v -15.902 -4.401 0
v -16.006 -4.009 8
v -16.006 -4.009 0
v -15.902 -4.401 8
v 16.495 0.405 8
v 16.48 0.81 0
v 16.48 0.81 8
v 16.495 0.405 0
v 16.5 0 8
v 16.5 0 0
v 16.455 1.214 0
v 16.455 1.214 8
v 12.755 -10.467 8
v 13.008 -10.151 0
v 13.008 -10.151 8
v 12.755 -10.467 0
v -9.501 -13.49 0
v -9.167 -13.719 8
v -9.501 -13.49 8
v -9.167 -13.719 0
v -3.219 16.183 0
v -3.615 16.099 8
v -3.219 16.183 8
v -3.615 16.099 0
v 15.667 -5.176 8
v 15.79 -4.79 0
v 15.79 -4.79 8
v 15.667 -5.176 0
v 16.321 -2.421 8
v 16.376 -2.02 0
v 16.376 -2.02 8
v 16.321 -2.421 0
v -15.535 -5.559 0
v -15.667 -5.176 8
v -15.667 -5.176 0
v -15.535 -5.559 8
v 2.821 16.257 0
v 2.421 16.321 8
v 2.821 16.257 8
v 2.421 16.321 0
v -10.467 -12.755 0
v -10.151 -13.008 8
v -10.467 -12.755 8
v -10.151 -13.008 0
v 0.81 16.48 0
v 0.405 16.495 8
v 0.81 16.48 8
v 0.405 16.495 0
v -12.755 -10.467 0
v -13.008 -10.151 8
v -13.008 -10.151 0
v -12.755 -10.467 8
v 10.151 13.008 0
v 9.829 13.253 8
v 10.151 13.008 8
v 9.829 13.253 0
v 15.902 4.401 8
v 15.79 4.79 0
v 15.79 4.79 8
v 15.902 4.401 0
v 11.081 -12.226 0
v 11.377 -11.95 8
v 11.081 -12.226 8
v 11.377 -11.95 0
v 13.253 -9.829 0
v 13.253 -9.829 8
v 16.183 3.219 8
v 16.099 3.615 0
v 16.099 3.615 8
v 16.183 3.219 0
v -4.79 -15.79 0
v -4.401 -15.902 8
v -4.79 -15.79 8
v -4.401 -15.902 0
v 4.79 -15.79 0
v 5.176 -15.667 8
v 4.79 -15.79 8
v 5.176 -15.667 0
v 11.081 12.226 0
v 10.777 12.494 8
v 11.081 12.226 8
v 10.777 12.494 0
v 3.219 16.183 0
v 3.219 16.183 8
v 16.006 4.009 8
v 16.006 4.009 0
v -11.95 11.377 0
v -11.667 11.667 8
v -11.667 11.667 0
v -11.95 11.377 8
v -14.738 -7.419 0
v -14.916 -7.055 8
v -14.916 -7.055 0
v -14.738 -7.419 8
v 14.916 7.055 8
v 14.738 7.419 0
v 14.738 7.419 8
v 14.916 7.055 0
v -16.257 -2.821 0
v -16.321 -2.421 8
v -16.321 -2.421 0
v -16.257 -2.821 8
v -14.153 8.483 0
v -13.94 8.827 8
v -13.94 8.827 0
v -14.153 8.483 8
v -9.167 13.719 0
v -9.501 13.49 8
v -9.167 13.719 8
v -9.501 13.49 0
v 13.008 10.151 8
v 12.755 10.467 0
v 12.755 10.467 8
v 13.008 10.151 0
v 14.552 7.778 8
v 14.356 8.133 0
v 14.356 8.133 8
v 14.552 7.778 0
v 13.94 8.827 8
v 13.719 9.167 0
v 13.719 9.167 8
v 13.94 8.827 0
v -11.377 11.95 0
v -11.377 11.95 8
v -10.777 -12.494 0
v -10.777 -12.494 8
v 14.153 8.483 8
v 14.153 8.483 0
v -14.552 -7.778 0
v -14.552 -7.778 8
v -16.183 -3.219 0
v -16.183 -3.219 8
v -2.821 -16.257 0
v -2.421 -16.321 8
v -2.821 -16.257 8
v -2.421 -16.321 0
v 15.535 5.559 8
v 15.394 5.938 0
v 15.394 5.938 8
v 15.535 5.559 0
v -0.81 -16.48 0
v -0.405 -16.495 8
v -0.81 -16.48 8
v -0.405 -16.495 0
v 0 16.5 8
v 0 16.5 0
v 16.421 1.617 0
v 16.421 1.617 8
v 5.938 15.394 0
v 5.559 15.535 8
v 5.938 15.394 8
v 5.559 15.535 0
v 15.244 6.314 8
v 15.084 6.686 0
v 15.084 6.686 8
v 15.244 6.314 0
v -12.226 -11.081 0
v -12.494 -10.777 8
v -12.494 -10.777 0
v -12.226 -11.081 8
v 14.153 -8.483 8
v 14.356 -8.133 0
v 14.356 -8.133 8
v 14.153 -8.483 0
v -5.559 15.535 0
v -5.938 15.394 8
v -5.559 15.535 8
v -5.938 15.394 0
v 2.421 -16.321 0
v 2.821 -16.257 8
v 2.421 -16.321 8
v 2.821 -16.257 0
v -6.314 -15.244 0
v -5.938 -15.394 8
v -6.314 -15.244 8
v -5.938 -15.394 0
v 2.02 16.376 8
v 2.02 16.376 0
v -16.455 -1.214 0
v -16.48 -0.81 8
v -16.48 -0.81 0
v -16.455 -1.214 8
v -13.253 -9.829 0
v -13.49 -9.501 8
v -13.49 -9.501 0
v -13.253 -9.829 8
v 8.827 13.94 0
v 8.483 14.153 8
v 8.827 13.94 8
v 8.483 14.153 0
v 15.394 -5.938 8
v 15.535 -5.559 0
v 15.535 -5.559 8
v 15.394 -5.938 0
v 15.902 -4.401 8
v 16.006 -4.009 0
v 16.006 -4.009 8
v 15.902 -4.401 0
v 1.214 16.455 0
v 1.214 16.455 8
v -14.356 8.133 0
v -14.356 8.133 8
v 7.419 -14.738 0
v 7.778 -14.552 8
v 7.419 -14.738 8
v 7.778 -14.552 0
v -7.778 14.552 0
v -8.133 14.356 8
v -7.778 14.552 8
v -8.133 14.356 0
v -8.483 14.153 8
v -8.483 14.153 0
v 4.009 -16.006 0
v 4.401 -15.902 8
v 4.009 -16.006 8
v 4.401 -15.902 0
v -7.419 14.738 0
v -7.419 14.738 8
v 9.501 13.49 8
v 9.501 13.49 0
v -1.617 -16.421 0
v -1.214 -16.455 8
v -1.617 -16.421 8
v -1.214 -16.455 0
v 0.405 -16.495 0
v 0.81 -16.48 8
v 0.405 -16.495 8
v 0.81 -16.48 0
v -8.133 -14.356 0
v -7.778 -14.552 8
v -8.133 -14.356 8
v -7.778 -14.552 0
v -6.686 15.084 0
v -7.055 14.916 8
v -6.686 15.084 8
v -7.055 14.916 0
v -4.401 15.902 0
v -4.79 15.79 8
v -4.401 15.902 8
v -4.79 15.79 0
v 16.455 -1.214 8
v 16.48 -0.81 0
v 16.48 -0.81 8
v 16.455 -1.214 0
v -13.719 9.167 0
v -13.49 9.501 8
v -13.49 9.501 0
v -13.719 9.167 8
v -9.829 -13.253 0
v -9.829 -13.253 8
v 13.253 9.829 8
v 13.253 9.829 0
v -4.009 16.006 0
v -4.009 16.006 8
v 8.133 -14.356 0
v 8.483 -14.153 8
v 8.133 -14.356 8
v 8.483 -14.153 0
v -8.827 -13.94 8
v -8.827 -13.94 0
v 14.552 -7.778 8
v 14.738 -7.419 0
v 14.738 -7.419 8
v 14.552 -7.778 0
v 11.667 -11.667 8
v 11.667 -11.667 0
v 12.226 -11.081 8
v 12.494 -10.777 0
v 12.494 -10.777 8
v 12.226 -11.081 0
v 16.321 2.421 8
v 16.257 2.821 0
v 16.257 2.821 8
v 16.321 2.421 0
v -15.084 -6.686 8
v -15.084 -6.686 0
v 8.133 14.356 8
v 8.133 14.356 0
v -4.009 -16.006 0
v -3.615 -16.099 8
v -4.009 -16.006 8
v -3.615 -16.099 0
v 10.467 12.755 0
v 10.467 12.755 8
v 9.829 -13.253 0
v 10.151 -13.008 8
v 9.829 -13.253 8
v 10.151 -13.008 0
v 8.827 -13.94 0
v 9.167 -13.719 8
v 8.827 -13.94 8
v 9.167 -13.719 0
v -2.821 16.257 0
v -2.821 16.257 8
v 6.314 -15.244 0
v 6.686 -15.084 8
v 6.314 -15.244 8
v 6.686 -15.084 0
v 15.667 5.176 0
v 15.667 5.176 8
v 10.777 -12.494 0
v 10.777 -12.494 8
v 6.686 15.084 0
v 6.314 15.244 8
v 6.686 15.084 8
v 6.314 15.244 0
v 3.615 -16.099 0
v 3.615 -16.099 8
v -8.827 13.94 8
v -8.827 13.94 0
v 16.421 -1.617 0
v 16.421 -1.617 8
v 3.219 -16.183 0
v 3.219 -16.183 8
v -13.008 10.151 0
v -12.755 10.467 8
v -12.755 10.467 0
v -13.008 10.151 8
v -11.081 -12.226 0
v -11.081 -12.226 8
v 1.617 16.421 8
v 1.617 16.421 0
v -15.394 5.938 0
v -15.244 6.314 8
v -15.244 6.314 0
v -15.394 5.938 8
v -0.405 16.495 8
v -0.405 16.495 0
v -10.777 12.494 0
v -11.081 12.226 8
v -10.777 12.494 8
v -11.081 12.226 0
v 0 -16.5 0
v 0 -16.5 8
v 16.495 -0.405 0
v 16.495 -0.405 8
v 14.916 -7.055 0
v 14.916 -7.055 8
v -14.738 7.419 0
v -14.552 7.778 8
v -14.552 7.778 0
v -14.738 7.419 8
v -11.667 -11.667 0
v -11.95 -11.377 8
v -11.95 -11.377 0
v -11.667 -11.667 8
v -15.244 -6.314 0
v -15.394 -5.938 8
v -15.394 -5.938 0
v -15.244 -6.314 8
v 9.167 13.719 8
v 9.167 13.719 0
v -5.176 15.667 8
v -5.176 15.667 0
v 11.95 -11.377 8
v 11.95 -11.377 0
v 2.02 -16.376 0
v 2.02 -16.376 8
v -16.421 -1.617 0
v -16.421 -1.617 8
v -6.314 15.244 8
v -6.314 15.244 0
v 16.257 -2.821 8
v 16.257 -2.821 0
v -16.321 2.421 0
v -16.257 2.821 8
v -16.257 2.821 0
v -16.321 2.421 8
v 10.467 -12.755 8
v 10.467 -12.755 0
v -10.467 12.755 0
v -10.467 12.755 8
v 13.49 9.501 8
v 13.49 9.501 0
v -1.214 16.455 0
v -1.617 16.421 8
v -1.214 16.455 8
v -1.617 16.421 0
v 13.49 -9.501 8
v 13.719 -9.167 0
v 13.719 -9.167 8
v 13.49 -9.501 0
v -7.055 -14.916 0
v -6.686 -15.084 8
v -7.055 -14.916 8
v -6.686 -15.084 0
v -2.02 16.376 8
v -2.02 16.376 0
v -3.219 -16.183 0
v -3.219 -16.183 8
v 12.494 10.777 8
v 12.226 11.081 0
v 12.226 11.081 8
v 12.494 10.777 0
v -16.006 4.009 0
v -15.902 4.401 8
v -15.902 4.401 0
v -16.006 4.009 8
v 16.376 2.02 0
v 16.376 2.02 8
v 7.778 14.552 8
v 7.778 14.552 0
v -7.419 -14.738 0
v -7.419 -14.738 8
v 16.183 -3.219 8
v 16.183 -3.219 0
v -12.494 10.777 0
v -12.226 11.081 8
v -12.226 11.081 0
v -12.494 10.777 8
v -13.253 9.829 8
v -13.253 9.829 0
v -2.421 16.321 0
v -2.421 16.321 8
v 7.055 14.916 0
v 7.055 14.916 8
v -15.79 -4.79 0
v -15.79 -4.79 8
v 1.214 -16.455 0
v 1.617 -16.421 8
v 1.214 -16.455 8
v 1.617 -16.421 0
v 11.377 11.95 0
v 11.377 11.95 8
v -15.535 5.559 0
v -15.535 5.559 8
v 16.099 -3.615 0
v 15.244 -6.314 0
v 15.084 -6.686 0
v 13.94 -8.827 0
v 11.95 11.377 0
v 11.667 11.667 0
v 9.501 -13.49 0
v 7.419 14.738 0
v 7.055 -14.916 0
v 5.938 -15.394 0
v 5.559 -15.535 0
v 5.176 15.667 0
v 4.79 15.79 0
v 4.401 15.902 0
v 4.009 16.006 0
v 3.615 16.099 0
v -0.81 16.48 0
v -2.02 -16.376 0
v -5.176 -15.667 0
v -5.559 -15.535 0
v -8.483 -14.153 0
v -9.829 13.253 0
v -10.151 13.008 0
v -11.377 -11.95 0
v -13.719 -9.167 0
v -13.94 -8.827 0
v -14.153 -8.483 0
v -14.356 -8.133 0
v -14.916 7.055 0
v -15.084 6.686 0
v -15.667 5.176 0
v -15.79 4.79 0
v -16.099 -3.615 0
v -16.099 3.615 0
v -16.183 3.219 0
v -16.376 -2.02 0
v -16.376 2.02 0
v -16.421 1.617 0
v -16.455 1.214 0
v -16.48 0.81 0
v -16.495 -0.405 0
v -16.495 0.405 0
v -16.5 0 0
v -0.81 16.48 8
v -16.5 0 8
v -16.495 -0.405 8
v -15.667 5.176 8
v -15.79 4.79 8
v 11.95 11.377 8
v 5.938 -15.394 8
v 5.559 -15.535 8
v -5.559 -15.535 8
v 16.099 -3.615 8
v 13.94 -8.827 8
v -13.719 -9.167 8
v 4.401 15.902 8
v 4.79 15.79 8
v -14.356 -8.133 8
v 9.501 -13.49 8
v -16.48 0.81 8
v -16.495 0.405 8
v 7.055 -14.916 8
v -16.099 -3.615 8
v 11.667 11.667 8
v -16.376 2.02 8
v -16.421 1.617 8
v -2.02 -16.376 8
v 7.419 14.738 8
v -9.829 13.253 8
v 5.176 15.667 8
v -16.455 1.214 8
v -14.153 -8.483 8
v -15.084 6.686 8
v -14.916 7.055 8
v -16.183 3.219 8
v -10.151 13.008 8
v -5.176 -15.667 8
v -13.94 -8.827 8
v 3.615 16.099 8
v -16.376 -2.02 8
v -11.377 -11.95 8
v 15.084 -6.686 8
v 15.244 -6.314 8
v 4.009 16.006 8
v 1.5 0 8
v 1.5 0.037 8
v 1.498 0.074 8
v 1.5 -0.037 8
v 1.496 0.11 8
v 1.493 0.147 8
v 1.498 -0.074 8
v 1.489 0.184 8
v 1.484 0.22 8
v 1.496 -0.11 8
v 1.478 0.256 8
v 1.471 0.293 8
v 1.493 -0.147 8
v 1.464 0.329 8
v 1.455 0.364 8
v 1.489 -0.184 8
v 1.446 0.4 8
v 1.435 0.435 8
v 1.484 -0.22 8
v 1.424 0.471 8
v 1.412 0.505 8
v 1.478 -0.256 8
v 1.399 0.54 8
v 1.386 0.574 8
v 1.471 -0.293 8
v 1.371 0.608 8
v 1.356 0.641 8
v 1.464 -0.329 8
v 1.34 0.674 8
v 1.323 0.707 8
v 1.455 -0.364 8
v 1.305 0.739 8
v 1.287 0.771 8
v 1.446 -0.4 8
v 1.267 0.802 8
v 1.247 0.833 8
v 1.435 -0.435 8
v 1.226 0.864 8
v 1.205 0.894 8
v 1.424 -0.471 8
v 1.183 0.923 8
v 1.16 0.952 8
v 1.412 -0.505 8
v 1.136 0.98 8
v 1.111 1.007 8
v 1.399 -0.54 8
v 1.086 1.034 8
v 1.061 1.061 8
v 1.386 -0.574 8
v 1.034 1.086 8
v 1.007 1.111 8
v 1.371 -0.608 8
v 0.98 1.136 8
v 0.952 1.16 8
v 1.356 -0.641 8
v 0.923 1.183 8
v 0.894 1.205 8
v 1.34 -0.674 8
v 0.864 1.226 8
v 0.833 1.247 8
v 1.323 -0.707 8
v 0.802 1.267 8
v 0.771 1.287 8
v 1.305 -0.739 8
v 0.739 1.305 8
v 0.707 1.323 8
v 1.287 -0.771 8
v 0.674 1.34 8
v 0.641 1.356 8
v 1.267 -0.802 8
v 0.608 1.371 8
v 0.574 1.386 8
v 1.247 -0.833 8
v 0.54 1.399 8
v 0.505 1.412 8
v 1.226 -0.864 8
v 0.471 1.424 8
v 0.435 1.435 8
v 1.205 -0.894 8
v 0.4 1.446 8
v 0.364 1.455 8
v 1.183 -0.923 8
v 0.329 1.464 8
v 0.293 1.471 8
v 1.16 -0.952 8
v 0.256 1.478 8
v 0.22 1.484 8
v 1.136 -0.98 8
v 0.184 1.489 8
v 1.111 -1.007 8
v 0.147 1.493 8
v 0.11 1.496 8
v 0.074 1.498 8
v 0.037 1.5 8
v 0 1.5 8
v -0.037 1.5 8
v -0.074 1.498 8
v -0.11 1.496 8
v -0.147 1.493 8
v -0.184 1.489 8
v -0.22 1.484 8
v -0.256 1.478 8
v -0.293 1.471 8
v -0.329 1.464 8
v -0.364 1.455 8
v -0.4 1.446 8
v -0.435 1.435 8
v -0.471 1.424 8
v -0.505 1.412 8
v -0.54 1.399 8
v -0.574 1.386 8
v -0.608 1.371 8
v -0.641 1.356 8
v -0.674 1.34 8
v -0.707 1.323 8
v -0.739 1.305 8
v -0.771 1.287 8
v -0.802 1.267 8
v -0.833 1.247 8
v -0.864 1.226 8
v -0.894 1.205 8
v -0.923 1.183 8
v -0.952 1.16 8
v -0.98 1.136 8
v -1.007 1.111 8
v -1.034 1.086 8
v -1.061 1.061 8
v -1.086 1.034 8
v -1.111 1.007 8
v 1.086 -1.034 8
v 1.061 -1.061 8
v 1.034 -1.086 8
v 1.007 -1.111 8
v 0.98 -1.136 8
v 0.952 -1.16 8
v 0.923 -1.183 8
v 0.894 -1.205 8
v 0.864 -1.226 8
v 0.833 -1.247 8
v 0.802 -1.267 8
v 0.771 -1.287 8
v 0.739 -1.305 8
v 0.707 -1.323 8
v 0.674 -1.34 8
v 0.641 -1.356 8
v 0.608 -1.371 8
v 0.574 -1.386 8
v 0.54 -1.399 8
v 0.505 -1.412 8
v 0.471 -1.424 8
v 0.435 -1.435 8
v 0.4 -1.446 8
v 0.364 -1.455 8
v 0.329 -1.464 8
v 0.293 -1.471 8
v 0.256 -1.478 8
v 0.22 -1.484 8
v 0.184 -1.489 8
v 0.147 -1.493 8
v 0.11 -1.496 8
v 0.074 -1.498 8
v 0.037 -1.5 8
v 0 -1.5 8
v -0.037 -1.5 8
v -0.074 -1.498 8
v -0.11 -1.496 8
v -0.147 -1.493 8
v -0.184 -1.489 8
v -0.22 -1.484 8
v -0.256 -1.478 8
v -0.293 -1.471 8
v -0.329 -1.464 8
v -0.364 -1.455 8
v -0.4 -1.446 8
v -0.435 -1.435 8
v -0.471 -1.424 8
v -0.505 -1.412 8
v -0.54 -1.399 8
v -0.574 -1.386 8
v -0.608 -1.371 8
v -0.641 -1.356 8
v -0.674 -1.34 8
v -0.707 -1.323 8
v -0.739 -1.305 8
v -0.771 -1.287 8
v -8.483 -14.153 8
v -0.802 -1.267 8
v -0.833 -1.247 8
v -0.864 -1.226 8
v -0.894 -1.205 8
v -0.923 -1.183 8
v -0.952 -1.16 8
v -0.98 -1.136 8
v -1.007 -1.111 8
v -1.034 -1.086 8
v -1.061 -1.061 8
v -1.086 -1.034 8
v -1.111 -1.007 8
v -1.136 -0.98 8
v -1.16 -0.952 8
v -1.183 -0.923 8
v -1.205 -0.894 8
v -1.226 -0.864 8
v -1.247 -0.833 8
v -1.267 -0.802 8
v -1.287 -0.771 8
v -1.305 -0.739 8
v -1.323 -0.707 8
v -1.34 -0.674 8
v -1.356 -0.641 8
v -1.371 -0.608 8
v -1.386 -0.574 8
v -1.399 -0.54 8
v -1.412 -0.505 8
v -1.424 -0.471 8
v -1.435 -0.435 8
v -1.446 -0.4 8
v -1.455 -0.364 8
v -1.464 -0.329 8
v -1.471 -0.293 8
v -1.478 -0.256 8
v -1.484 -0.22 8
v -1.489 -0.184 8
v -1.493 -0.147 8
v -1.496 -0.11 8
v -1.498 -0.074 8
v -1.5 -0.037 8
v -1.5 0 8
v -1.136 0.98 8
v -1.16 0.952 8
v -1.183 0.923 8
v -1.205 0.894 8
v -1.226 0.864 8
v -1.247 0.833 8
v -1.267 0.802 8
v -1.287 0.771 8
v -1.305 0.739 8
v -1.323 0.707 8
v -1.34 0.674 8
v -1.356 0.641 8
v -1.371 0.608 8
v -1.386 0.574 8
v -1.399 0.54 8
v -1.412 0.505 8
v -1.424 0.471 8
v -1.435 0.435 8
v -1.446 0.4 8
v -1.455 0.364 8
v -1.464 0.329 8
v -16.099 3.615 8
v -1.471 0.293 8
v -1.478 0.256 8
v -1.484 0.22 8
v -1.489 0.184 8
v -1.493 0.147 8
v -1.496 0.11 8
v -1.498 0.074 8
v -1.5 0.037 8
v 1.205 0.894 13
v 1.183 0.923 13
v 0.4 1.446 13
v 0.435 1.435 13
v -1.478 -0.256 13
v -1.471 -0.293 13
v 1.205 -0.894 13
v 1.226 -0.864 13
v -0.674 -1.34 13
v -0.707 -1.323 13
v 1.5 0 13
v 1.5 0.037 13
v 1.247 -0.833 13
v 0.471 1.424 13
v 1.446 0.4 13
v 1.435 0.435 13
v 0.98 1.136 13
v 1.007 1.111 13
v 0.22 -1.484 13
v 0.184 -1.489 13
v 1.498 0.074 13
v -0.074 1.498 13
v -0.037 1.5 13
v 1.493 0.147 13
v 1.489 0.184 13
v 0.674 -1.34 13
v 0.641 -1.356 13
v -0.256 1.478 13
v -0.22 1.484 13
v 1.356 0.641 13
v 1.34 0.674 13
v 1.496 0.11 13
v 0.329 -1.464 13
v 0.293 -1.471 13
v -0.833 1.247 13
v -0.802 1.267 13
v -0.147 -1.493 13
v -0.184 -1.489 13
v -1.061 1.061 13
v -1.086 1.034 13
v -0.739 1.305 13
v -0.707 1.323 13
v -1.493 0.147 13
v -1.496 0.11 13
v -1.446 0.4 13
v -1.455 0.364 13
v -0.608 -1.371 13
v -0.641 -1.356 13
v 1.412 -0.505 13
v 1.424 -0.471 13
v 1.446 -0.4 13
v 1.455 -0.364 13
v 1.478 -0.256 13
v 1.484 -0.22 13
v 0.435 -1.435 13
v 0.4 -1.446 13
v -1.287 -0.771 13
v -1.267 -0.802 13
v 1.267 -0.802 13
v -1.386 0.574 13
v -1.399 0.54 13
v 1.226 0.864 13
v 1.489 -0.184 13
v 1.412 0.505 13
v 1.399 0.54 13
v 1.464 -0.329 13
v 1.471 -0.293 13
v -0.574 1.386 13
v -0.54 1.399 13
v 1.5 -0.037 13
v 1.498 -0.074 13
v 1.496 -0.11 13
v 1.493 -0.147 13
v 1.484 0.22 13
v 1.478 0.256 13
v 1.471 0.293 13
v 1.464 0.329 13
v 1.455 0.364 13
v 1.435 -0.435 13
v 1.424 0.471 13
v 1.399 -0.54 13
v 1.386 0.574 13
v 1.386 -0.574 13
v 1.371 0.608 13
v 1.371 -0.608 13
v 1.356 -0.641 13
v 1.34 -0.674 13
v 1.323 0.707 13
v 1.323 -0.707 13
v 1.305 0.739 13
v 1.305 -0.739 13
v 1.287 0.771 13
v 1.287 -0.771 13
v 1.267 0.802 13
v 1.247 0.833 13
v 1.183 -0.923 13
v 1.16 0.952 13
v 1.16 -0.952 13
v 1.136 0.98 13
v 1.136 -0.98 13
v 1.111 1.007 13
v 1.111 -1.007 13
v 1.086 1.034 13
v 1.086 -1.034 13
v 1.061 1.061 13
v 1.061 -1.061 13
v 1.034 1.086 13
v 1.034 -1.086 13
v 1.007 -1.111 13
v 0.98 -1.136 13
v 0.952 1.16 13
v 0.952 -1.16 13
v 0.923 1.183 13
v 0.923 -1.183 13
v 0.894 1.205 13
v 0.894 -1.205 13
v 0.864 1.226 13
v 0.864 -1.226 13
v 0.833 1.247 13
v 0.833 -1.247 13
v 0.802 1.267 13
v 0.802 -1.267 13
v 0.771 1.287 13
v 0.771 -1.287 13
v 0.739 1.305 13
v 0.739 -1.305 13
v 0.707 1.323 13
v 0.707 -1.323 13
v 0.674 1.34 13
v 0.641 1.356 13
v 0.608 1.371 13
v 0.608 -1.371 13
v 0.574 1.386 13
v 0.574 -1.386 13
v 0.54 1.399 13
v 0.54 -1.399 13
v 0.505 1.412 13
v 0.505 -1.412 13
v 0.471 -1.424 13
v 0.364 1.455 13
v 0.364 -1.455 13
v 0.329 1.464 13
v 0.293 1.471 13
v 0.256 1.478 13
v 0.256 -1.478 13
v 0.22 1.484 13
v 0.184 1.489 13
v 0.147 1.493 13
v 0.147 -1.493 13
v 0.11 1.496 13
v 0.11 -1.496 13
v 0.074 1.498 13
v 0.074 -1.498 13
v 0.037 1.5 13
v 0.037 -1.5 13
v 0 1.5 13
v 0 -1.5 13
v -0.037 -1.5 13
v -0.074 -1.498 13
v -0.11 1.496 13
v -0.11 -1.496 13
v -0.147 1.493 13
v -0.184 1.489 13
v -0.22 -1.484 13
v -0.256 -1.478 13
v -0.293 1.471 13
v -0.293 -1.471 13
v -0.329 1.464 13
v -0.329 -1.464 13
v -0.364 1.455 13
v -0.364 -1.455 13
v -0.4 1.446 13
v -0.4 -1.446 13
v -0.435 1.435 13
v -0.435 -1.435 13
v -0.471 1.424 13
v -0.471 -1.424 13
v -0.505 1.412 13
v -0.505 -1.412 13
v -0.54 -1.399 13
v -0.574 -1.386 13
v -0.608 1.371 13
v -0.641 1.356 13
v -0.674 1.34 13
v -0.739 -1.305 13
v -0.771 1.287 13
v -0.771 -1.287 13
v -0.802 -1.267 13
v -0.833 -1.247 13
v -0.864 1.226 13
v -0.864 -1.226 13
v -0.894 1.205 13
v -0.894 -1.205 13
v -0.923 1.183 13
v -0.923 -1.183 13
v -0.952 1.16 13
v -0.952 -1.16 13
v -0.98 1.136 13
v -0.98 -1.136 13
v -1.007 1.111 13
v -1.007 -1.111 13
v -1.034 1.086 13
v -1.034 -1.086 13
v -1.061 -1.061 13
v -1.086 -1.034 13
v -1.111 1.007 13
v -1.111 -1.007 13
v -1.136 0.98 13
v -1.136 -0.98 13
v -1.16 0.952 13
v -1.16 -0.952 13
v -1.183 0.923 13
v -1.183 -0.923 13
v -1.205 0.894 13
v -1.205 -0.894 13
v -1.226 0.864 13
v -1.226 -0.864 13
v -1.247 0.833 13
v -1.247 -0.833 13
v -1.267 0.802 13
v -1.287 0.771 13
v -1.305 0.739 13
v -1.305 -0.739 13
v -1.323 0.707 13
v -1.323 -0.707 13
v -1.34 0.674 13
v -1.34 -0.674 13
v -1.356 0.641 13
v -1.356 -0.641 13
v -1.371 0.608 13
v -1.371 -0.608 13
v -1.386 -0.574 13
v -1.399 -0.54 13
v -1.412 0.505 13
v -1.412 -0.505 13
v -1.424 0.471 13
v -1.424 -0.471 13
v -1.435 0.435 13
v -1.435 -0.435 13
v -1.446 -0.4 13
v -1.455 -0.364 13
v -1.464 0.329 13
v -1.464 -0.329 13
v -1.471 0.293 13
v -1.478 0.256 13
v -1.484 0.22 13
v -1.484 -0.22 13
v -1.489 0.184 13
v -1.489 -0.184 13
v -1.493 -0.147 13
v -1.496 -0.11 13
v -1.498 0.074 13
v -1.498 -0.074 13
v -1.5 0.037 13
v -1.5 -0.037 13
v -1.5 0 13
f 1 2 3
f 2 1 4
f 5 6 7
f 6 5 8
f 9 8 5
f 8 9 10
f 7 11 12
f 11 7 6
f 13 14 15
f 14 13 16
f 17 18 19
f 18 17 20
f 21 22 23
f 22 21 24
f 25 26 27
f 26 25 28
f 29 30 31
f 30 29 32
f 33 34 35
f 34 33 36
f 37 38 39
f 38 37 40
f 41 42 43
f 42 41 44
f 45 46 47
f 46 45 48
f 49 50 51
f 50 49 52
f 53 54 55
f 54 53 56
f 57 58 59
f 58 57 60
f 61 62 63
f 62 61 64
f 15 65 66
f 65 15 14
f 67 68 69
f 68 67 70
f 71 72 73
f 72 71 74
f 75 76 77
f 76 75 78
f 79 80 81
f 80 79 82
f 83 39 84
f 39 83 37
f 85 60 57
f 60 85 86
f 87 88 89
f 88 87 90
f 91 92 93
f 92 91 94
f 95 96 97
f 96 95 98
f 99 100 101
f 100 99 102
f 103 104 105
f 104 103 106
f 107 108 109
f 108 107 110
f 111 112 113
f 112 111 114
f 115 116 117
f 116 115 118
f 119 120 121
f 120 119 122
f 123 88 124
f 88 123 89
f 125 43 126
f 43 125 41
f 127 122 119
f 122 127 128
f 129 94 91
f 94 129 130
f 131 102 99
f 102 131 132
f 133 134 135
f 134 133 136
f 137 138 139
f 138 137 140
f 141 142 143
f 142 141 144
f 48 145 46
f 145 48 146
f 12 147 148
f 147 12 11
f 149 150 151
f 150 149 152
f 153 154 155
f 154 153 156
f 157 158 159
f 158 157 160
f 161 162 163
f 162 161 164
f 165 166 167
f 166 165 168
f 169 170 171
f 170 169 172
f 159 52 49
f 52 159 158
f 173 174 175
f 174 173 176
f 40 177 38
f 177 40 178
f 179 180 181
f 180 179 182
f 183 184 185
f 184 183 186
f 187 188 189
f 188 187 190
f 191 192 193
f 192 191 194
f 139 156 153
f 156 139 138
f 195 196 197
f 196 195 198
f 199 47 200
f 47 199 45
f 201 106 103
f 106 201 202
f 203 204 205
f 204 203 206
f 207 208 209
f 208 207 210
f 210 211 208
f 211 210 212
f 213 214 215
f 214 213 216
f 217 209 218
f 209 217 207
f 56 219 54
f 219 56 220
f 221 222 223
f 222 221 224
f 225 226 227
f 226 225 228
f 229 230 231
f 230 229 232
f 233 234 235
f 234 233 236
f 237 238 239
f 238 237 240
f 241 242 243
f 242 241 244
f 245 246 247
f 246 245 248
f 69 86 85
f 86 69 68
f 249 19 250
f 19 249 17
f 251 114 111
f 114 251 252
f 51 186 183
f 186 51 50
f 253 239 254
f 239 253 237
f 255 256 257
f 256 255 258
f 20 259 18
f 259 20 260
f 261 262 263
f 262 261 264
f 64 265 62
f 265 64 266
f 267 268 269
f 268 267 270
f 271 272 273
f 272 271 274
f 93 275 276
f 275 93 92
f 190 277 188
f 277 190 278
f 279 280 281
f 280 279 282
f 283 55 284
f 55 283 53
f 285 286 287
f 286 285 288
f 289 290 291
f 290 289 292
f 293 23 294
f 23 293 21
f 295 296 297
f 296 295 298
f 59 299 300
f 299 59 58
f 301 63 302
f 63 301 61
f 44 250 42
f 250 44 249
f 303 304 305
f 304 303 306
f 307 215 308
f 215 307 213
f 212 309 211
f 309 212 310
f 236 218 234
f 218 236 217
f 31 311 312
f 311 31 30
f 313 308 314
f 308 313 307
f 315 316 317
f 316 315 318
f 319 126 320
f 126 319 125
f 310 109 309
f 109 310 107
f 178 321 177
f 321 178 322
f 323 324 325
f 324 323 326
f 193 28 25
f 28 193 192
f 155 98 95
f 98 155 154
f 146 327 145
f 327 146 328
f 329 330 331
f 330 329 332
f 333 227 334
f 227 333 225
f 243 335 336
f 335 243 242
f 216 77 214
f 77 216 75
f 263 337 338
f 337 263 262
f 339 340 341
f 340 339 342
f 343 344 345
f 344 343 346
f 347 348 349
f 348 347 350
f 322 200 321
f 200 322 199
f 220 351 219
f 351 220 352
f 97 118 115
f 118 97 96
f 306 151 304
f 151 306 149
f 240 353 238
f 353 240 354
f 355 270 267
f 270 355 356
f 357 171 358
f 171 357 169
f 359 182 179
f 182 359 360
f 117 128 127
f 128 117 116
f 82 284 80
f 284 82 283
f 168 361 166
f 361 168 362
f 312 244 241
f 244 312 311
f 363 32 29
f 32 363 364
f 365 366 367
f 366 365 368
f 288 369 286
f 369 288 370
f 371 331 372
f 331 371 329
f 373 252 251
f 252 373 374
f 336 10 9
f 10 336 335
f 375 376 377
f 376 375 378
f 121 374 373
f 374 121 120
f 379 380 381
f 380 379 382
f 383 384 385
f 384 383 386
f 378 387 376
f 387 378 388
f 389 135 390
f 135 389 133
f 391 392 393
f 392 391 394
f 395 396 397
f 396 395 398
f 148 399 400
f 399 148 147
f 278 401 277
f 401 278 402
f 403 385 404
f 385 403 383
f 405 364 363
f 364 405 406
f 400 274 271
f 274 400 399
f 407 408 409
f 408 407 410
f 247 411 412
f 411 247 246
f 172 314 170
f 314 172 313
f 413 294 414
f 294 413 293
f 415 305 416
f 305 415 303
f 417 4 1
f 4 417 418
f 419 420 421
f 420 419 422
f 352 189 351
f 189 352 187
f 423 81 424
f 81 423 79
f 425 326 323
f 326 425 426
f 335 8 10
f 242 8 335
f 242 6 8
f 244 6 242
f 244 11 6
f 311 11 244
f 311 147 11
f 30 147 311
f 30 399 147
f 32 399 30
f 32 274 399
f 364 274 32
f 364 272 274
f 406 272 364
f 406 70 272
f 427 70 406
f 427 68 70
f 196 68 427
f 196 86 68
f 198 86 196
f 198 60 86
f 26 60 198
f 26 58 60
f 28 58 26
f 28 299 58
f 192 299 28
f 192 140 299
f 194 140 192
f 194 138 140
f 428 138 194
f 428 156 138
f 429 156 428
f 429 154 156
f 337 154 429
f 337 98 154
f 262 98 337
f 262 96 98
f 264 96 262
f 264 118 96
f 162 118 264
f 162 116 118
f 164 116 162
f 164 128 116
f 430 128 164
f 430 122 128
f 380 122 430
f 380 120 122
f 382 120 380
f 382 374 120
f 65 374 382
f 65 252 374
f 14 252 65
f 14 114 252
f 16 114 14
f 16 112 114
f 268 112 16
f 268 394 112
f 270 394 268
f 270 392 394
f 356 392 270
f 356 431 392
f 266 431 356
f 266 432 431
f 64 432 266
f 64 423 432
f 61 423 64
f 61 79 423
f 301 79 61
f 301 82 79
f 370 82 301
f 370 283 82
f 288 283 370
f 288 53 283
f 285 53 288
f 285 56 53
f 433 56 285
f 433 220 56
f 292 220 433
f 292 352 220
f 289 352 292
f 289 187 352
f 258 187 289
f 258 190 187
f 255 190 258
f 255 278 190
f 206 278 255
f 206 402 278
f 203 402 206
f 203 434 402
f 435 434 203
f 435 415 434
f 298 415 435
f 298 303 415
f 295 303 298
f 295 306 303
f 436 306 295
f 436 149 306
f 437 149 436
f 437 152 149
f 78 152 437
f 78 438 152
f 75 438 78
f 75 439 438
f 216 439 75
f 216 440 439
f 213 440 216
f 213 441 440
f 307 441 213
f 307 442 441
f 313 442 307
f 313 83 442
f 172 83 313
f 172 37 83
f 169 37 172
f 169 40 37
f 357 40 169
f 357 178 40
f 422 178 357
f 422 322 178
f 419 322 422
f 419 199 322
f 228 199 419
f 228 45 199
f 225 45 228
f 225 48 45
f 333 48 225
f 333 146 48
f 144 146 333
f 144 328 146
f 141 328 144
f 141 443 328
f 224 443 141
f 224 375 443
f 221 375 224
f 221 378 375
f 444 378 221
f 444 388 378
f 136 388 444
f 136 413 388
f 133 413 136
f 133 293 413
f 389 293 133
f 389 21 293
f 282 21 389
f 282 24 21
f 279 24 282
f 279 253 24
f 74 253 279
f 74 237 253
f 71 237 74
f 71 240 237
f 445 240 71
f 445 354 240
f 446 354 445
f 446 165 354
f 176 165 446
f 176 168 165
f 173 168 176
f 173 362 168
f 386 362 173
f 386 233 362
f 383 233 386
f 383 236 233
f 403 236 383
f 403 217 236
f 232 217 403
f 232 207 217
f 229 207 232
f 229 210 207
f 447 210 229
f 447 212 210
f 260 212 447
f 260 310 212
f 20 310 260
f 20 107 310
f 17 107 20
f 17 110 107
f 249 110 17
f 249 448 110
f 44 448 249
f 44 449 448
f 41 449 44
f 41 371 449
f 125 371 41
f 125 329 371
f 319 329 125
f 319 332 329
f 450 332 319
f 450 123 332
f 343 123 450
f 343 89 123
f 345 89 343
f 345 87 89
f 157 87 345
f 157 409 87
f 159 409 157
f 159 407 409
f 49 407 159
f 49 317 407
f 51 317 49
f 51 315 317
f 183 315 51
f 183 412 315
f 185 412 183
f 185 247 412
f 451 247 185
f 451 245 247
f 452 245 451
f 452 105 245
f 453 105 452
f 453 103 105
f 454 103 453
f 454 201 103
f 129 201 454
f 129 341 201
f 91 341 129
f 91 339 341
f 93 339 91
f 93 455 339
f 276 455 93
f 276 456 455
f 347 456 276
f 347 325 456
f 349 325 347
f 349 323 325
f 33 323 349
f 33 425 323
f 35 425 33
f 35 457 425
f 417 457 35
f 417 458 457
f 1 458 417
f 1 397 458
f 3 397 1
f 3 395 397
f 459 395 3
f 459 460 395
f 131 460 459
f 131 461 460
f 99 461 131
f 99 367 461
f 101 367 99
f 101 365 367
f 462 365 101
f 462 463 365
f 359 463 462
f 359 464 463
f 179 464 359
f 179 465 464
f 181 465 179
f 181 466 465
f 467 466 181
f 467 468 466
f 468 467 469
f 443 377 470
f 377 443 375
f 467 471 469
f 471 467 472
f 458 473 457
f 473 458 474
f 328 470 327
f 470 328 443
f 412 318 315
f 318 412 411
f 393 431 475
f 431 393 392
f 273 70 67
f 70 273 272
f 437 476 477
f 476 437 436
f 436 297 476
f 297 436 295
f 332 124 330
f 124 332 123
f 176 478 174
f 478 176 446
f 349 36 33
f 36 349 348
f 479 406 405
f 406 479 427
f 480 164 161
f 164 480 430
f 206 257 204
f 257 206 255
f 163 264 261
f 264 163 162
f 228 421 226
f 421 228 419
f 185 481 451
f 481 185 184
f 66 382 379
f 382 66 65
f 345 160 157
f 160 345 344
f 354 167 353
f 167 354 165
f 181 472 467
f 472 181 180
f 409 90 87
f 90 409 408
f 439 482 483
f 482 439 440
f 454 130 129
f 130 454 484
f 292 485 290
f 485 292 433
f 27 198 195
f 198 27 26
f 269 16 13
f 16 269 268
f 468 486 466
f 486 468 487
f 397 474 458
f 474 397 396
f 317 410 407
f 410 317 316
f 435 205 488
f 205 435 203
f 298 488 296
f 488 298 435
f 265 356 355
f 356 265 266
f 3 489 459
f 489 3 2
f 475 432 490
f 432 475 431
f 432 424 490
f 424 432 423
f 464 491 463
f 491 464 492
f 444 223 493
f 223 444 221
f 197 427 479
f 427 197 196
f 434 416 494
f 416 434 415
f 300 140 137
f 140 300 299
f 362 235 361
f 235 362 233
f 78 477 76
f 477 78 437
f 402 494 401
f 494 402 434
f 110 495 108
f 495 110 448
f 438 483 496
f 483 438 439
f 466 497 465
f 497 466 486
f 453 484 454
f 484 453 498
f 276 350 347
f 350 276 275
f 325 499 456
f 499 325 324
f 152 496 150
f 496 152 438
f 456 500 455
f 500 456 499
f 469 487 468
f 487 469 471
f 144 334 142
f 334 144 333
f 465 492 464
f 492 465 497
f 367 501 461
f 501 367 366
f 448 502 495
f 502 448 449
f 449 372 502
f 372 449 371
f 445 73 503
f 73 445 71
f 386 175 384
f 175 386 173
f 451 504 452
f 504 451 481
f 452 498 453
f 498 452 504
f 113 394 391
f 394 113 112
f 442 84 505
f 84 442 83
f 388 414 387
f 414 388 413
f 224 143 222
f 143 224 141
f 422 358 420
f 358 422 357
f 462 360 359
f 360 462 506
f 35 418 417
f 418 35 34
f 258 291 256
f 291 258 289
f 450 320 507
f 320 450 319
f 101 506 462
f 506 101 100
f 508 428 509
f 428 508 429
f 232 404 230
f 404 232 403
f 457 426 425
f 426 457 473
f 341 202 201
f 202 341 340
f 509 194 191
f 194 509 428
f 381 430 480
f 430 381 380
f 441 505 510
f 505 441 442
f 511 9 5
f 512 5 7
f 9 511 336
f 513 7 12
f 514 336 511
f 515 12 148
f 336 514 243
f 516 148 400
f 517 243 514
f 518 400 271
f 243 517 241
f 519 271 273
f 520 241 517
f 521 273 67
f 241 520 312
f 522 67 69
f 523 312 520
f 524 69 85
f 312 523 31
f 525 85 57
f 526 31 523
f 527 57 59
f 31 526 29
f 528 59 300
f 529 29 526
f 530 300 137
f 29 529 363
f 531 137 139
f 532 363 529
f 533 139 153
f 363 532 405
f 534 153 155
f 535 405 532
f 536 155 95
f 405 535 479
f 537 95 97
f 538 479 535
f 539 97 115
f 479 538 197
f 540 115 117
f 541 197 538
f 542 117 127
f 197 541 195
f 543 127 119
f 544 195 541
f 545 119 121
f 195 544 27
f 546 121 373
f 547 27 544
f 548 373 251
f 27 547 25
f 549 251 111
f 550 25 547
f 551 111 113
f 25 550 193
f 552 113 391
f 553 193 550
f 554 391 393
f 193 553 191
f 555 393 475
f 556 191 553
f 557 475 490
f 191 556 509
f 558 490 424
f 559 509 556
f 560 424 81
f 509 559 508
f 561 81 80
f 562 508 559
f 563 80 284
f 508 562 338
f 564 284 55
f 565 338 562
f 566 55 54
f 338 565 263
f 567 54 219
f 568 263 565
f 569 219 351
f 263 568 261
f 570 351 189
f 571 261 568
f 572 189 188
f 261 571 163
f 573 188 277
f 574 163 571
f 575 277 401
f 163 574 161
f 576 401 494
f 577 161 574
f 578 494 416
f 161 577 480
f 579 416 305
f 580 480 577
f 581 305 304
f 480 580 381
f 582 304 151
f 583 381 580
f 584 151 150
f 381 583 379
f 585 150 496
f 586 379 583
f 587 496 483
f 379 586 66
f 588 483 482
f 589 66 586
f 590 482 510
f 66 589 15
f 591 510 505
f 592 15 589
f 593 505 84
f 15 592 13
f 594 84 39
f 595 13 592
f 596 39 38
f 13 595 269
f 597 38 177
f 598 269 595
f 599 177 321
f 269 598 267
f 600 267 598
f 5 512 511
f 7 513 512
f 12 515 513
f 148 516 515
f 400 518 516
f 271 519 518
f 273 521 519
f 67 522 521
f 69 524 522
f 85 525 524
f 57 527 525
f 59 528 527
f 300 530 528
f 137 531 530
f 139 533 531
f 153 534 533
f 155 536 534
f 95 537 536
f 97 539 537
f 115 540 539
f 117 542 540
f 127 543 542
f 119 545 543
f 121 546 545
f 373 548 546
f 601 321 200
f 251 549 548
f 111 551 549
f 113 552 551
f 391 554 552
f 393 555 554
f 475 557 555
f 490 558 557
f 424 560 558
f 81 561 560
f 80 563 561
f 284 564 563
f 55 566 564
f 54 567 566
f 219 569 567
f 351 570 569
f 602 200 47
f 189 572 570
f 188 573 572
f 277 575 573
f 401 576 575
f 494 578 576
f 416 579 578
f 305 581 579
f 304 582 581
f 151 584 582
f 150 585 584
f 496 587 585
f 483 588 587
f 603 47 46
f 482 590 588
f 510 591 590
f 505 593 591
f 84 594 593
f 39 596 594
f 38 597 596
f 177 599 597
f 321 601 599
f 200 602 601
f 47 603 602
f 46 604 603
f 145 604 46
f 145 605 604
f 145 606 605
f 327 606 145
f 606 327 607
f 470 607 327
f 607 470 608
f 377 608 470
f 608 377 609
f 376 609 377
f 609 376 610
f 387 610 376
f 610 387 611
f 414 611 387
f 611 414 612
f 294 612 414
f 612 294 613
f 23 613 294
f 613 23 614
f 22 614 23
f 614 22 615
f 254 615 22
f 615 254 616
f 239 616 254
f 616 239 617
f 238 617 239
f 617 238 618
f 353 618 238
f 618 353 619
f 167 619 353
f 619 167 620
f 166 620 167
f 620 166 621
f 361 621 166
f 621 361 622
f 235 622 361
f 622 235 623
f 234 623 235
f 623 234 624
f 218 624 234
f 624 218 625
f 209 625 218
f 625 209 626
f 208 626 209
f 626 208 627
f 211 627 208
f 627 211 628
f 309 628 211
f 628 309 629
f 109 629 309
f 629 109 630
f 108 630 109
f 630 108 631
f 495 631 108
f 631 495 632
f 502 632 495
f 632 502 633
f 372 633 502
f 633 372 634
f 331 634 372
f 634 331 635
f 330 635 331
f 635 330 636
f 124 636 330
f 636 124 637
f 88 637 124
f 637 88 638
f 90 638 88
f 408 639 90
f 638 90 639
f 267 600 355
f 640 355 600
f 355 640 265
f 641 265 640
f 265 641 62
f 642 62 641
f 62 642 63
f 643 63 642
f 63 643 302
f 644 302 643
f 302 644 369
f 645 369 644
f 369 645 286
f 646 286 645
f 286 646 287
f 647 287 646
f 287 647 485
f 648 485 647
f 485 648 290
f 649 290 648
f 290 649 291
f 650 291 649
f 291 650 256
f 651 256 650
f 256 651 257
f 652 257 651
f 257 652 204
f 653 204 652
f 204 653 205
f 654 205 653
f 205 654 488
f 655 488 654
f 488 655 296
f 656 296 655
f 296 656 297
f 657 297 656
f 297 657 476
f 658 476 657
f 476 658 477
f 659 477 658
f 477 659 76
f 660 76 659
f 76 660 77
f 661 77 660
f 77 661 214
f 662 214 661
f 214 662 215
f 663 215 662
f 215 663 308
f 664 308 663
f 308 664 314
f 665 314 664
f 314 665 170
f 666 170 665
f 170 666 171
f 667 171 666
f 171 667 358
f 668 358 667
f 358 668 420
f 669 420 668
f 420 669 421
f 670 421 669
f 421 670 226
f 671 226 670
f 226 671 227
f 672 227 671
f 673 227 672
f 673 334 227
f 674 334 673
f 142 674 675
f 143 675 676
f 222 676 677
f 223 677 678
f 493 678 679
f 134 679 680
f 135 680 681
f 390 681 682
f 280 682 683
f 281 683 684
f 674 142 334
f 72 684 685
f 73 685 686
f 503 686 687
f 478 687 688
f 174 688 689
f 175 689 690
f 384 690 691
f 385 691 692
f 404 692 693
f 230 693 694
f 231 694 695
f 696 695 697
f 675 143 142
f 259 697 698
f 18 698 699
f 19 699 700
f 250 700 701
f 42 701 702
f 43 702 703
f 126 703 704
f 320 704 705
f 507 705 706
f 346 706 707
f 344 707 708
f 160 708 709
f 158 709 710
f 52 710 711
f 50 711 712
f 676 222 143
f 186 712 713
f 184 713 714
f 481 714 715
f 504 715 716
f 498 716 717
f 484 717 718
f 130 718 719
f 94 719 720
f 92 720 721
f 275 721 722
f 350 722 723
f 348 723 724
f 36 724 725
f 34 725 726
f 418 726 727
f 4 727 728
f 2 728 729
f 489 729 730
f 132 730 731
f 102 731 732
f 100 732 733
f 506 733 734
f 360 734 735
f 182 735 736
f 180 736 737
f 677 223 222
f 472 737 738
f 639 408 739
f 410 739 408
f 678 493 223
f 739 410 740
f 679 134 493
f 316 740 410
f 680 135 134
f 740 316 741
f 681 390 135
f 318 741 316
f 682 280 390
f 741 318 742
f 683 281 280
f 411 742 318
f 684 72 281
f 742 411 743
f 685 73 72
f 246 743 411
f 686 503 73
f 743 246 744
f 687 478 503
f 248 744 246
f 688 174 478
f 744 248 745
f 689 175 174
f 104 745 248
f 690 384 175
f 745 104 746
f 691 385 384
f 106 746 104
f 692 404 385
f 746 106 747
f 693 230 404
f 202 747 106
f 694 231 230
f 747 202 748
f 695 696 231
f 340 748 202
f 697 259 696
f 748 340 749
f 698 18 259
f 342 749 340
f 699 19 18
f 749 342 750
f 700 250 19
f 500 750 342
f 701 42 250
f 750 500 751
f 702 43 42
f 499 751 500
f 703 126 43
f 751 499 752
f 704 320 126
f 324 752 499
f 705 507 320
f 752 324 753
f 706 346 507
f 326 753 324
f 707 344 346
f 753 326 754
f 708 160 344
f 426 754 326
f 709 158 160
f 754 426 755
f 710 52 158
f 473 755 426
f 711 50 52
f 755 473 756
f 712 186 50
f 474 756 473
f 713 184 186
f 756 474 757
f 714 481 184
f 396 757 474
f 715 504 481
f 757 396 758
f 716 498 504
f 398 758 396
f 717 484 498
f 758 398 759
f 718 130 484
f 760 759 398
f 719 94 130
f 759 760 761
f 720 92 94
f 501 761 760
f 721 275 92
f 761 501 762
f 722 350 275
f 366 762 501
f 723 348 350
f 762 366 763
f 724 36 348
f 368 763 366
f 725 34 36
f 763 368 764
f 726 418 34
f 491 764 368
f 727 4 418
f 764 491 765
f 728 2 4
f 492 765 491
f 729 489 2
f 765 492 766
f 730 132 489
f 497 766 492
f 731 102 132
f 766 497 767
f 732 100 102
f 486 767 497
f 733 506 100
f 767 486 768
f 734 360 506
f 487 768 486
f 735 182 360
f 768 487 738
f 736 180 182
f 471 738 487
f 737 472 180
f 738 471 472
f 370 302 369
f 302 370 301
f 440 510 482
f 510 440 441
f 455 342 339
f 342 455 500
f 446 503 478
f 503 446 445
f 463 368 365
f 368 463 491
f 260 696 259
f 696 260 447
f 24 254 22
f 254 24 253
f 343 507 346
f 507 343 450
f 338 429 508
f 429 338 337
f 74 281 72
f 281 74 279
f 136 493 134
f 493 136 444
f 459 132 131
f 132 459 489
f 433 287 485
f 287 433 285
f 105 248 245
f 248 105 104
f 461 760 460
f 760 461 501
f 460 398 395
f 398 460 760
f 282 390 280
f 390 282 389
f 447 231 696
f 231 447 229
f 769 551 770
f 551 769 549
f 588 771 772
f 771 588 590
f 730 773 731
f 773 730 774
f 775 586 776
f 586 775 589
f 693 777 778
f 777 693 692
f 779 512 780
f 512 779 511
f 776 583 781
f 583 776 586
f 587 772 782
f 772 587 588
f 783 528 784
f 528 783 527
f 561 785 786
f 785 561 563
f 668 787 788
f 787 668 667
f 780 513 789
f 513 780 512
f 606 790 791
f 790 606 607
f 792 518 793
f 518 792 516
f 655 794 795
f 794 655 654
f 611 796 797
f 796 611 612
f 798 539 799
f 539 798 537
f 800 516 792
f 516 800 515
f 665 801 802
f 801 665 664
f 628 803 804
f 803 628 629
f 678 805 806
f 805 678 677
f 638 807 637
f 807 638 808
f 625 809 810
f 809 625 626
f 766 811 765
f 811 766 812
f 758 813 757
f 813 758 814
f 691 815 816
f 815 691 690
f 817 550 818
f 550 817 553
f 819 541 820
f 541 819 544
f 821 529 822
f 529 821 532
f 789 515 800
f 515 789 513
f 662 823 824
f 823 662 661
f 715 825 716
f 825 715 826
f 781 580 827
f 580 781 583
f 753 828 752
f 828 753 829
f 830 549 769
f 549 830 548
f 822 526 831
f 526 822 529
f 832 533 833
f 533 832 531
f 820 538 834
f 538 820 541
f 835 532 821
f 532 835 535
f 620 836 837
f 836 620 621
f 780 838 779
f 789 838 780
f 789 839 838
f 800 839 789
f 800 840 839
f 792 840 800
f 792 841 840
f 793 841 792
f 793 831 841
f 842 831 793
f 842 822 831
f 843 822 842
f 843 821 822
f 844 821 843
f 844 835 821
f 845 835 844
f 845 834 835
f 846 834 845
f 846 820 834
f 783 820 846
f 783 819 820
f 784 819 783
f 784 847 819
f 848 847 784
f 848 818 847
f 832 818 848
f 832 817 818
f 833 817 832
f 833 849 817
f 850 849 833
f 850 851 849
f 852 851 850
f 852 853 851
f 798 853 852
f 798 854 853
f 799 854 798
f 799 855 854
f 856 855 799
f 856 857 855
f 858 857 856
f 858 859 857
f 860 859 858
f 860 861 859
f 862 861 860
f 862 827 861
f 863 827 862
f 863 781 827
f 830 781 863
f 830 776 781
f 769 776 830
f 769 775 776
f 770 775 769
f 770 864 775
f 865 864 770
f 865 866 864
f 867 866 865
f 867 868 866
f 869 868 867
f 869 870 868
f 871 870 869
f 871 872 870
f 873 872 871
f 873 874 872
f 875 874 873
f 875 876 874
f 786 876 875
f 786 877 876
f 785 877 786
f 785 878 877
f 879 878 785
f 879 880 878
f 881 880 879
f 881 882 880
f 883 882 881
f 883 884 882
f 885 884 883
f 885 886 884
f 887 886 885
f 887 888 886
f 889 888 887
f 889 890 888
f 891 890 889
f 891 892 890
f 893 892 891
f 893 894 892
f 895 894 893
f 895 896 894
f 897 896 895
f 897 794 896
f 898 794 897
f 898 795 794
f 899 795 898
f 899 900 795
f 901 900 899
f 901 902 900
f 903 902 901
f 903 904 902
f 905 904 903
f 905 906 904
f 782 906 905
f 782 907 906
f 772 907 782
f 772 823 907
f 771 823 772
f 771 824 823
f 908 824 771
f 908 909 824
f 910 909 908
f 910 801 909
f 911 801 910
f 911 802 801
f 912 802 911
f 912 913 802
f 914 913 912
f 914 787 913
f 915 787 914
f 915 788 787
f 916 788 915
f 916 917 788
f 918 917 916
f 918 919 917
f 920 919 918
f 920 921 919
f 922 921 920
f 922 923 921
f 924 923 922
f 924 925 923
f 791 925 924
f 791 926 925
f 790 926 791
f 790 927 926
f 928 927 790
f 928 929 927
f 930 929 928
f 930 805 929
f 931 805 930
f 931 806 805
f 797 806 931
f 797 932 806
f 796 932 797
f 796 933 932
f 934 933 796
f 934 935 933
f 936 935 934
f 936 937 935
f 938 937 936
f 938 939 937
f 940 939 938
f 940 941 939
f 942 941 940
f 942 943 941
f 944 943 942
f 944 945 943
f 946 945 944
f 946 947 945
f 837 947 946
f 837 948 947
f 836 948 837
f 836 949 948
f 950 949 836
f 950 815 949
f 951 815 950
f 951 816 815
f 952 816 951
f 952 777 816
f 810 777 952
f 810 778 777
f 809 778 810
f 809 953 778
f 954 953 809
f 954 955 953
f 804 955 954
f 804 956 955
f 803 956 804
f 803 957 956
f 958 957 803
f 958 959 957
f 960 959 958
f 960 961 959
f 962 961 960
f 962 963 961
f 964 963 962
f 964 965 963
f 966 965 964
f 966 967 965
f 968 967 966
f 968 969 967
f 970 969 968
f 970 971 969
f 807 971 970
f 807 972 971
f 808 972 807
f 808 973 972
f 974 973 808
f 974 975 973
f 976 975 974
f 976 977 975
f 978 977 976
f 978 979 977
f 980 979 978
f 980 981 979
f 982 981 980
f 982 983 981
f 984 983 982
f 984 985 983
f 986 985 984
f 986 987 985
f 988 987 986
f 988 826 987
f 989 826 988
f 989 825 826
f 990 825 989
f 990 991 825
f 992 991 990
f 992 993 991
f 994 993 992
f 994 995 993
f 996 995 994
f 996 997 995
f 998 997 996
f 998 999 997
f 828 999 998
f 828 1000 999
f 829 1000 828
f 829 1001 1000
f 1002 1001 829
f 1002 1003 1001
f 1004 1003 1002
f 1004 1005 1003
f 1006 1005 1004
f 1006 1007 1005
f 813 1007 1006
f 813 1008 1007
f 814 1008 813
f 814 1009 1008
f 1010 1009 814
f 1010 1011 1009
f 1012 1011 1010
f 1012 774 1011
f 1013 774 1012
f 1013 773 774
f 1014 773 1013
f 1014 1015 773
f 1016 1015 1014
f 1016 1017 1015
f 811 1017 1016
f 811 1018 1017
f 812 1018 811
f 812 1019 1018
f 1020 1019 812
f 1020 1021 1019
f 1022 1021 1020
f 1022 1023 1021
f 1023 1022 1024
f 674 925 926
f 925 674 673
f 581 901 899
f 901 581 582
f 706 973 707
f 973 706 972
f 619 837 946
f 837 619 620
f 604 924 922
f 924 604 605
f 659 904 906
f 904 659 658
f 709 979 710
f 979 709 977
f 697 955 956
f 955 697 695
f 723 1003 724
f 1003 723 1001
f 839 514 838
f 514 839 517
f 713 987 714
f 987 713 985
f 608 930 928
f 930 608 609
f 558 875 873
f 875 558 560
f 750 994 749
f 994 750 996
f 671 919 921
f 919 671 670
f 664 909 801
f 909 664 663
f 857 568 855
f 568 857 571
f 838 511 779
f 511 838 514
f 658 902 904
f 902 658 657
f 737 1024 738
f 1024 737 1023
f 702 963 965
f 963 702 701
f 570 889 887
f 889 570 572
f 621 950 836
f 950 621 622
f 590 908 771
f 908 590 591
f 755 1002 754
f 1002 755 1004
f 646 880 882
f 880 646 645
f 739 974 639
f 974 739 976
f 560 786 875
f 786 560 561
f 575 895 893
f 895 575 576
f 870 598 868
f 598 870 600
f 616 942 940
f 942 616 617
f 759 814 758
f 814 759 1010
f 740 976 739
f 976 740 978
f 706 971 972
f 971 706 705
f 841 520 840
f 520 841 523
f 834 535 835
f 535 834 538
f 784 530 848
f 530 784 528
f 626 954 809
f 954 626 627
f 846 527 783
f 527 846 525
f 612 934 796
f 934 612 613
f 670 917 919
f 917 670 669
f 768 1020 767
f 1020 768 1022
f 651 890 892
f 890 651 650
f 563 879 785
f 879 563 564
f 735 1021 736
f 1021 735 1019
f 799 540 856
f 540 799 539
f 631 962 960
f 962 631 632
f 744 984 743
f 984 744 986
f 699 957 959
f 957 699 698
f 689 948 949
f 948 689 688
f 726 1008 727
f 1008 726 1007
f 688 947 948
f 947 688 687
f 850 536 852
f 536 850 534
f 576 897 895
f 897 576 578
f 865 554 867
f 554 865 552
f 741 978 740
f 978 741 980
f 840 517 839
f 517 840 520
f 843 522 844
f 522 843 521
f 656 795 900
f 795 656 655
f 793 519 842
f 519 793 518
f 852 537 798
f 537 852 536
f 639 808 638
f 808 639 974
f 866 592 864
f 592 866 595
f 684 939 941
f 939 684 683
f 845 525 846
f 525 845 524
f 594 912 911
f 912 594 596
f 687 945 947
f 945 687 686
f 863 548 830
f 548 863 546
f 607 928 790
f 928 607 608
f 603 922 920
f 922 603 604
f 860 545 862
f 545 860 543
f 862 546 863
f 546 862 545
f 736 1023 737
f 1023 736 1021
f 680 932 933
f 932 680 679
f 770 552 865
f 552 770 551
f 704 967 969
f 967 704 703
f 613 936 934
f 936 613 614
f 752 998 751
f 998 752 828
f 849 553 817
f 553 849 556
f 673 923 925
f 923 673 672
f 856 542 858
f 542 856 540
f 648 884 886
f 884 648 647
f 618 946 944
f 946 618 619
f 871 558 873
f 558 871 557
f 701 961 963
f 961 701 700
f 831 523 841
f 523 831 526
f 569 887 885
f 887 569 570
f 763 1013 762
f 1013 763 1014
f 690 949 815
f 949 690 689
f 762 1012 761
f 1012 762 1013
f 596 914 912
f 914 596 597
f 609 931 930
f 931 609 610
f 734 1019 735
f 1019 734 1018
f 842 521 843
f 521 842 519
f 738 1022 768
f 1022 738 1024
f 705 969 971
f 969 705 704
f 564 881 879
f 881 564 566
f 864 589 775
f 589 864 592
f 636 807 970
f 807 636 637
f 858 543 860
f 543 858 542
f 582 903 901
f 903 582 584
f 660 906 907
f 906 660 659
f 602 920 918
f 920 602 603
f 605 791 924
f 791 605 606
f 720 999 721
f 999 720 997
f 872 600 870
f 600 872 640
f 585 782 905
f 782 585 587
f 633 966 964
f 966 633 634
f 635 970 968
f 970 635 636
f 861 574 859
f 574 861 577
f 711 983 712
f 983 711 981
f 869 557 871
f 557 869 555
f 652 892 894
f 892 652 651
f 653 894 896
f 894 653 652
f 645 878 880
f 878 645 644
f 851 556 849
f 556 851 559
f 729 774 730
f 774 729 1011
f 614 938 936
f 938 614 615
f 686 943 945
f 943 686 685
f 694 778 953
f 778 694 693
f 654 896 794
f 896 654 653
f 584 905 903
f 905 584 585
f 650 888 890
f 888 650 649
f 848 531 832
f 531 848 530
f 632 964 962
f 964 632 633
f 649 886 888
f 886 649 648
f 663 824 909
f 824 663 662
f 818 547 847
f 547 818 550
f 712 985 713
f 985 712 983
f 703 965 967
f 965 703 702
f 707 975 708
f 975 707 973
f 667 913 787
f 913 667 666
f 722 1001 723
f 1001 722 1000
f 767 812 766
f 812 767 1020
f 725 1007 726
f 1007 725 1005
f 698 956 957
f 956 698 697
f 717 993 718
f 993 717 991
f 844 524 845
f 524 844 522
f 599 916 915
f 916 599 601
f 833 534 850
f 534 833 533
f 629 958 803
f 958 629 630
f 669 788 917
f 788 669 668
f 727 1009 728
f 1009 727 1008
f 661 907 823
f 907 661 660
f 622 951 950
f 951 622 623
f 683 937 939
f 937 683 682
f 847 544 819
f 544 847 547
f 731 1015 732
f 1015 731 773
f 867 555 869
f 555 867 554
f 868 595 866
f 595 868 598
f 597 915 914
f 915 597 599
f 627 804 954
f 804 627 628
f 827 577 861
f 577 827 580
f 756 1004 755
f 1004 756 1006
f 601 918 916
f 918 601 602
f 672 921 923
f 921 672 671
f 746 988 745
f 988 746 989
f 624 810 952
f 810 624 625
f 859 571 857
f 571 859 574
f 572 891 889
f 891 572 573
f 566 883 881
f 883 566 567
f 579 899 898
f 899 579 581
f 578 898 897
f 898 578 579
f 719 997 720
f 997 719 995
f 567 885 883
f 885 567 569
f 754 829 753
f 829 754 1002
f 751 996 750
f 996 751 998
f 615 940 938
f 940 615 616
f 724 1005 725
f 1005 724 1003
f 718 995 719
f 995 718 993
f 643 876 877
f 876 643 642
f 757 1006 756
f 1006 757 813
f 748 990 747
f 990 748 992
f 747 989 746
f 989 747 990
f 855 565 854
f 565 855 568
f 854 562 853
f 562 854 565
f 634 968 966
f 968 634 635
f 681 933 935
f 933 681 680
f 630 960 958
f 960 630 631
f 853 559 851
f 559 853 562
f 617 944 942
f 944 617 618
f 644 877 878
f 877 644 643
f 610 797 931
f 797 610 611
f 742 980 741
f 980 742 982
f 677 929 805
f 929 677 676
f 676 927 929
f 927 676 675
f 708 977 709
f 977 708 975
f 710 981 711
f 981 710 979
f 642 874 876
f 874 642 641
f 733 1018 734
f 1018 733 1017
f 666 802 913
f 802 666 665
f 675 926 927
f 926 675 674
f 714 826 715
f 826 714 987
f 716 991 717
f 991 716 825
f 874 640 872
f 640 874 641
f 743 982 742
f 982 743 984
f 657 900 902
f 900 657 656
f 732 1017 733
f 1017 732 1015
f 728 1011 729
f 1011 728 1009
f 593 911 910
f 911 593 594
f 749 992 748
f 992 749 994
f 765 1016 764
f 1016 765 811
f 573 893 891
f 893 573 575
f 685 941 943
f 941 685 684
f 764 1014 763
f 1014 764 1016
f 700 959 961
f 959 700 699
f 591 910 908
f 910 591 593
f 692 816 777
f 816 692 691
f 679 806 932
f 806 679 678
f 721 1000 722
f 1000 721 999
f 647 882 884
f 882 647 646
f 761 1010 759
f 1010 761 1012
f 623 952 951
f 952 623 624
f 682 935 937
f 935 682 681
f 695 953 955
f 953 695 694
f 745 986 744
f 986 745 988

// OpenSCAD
// create a jig that fits in the center of the lazy susan bearing and aligns the bearing with the pin hole

hole_diameter = 33;
hole_height = 8;

pin_diameter = 3;
pin_height = 5;

union() {
    cylinder(h=hole_height, d=hole_diameter, center=false, $fn=256);
    translate([0,0,hole_height])
        cylinder(h=pin_height, d=pin_diameter, center=false, $fn=256);
}
